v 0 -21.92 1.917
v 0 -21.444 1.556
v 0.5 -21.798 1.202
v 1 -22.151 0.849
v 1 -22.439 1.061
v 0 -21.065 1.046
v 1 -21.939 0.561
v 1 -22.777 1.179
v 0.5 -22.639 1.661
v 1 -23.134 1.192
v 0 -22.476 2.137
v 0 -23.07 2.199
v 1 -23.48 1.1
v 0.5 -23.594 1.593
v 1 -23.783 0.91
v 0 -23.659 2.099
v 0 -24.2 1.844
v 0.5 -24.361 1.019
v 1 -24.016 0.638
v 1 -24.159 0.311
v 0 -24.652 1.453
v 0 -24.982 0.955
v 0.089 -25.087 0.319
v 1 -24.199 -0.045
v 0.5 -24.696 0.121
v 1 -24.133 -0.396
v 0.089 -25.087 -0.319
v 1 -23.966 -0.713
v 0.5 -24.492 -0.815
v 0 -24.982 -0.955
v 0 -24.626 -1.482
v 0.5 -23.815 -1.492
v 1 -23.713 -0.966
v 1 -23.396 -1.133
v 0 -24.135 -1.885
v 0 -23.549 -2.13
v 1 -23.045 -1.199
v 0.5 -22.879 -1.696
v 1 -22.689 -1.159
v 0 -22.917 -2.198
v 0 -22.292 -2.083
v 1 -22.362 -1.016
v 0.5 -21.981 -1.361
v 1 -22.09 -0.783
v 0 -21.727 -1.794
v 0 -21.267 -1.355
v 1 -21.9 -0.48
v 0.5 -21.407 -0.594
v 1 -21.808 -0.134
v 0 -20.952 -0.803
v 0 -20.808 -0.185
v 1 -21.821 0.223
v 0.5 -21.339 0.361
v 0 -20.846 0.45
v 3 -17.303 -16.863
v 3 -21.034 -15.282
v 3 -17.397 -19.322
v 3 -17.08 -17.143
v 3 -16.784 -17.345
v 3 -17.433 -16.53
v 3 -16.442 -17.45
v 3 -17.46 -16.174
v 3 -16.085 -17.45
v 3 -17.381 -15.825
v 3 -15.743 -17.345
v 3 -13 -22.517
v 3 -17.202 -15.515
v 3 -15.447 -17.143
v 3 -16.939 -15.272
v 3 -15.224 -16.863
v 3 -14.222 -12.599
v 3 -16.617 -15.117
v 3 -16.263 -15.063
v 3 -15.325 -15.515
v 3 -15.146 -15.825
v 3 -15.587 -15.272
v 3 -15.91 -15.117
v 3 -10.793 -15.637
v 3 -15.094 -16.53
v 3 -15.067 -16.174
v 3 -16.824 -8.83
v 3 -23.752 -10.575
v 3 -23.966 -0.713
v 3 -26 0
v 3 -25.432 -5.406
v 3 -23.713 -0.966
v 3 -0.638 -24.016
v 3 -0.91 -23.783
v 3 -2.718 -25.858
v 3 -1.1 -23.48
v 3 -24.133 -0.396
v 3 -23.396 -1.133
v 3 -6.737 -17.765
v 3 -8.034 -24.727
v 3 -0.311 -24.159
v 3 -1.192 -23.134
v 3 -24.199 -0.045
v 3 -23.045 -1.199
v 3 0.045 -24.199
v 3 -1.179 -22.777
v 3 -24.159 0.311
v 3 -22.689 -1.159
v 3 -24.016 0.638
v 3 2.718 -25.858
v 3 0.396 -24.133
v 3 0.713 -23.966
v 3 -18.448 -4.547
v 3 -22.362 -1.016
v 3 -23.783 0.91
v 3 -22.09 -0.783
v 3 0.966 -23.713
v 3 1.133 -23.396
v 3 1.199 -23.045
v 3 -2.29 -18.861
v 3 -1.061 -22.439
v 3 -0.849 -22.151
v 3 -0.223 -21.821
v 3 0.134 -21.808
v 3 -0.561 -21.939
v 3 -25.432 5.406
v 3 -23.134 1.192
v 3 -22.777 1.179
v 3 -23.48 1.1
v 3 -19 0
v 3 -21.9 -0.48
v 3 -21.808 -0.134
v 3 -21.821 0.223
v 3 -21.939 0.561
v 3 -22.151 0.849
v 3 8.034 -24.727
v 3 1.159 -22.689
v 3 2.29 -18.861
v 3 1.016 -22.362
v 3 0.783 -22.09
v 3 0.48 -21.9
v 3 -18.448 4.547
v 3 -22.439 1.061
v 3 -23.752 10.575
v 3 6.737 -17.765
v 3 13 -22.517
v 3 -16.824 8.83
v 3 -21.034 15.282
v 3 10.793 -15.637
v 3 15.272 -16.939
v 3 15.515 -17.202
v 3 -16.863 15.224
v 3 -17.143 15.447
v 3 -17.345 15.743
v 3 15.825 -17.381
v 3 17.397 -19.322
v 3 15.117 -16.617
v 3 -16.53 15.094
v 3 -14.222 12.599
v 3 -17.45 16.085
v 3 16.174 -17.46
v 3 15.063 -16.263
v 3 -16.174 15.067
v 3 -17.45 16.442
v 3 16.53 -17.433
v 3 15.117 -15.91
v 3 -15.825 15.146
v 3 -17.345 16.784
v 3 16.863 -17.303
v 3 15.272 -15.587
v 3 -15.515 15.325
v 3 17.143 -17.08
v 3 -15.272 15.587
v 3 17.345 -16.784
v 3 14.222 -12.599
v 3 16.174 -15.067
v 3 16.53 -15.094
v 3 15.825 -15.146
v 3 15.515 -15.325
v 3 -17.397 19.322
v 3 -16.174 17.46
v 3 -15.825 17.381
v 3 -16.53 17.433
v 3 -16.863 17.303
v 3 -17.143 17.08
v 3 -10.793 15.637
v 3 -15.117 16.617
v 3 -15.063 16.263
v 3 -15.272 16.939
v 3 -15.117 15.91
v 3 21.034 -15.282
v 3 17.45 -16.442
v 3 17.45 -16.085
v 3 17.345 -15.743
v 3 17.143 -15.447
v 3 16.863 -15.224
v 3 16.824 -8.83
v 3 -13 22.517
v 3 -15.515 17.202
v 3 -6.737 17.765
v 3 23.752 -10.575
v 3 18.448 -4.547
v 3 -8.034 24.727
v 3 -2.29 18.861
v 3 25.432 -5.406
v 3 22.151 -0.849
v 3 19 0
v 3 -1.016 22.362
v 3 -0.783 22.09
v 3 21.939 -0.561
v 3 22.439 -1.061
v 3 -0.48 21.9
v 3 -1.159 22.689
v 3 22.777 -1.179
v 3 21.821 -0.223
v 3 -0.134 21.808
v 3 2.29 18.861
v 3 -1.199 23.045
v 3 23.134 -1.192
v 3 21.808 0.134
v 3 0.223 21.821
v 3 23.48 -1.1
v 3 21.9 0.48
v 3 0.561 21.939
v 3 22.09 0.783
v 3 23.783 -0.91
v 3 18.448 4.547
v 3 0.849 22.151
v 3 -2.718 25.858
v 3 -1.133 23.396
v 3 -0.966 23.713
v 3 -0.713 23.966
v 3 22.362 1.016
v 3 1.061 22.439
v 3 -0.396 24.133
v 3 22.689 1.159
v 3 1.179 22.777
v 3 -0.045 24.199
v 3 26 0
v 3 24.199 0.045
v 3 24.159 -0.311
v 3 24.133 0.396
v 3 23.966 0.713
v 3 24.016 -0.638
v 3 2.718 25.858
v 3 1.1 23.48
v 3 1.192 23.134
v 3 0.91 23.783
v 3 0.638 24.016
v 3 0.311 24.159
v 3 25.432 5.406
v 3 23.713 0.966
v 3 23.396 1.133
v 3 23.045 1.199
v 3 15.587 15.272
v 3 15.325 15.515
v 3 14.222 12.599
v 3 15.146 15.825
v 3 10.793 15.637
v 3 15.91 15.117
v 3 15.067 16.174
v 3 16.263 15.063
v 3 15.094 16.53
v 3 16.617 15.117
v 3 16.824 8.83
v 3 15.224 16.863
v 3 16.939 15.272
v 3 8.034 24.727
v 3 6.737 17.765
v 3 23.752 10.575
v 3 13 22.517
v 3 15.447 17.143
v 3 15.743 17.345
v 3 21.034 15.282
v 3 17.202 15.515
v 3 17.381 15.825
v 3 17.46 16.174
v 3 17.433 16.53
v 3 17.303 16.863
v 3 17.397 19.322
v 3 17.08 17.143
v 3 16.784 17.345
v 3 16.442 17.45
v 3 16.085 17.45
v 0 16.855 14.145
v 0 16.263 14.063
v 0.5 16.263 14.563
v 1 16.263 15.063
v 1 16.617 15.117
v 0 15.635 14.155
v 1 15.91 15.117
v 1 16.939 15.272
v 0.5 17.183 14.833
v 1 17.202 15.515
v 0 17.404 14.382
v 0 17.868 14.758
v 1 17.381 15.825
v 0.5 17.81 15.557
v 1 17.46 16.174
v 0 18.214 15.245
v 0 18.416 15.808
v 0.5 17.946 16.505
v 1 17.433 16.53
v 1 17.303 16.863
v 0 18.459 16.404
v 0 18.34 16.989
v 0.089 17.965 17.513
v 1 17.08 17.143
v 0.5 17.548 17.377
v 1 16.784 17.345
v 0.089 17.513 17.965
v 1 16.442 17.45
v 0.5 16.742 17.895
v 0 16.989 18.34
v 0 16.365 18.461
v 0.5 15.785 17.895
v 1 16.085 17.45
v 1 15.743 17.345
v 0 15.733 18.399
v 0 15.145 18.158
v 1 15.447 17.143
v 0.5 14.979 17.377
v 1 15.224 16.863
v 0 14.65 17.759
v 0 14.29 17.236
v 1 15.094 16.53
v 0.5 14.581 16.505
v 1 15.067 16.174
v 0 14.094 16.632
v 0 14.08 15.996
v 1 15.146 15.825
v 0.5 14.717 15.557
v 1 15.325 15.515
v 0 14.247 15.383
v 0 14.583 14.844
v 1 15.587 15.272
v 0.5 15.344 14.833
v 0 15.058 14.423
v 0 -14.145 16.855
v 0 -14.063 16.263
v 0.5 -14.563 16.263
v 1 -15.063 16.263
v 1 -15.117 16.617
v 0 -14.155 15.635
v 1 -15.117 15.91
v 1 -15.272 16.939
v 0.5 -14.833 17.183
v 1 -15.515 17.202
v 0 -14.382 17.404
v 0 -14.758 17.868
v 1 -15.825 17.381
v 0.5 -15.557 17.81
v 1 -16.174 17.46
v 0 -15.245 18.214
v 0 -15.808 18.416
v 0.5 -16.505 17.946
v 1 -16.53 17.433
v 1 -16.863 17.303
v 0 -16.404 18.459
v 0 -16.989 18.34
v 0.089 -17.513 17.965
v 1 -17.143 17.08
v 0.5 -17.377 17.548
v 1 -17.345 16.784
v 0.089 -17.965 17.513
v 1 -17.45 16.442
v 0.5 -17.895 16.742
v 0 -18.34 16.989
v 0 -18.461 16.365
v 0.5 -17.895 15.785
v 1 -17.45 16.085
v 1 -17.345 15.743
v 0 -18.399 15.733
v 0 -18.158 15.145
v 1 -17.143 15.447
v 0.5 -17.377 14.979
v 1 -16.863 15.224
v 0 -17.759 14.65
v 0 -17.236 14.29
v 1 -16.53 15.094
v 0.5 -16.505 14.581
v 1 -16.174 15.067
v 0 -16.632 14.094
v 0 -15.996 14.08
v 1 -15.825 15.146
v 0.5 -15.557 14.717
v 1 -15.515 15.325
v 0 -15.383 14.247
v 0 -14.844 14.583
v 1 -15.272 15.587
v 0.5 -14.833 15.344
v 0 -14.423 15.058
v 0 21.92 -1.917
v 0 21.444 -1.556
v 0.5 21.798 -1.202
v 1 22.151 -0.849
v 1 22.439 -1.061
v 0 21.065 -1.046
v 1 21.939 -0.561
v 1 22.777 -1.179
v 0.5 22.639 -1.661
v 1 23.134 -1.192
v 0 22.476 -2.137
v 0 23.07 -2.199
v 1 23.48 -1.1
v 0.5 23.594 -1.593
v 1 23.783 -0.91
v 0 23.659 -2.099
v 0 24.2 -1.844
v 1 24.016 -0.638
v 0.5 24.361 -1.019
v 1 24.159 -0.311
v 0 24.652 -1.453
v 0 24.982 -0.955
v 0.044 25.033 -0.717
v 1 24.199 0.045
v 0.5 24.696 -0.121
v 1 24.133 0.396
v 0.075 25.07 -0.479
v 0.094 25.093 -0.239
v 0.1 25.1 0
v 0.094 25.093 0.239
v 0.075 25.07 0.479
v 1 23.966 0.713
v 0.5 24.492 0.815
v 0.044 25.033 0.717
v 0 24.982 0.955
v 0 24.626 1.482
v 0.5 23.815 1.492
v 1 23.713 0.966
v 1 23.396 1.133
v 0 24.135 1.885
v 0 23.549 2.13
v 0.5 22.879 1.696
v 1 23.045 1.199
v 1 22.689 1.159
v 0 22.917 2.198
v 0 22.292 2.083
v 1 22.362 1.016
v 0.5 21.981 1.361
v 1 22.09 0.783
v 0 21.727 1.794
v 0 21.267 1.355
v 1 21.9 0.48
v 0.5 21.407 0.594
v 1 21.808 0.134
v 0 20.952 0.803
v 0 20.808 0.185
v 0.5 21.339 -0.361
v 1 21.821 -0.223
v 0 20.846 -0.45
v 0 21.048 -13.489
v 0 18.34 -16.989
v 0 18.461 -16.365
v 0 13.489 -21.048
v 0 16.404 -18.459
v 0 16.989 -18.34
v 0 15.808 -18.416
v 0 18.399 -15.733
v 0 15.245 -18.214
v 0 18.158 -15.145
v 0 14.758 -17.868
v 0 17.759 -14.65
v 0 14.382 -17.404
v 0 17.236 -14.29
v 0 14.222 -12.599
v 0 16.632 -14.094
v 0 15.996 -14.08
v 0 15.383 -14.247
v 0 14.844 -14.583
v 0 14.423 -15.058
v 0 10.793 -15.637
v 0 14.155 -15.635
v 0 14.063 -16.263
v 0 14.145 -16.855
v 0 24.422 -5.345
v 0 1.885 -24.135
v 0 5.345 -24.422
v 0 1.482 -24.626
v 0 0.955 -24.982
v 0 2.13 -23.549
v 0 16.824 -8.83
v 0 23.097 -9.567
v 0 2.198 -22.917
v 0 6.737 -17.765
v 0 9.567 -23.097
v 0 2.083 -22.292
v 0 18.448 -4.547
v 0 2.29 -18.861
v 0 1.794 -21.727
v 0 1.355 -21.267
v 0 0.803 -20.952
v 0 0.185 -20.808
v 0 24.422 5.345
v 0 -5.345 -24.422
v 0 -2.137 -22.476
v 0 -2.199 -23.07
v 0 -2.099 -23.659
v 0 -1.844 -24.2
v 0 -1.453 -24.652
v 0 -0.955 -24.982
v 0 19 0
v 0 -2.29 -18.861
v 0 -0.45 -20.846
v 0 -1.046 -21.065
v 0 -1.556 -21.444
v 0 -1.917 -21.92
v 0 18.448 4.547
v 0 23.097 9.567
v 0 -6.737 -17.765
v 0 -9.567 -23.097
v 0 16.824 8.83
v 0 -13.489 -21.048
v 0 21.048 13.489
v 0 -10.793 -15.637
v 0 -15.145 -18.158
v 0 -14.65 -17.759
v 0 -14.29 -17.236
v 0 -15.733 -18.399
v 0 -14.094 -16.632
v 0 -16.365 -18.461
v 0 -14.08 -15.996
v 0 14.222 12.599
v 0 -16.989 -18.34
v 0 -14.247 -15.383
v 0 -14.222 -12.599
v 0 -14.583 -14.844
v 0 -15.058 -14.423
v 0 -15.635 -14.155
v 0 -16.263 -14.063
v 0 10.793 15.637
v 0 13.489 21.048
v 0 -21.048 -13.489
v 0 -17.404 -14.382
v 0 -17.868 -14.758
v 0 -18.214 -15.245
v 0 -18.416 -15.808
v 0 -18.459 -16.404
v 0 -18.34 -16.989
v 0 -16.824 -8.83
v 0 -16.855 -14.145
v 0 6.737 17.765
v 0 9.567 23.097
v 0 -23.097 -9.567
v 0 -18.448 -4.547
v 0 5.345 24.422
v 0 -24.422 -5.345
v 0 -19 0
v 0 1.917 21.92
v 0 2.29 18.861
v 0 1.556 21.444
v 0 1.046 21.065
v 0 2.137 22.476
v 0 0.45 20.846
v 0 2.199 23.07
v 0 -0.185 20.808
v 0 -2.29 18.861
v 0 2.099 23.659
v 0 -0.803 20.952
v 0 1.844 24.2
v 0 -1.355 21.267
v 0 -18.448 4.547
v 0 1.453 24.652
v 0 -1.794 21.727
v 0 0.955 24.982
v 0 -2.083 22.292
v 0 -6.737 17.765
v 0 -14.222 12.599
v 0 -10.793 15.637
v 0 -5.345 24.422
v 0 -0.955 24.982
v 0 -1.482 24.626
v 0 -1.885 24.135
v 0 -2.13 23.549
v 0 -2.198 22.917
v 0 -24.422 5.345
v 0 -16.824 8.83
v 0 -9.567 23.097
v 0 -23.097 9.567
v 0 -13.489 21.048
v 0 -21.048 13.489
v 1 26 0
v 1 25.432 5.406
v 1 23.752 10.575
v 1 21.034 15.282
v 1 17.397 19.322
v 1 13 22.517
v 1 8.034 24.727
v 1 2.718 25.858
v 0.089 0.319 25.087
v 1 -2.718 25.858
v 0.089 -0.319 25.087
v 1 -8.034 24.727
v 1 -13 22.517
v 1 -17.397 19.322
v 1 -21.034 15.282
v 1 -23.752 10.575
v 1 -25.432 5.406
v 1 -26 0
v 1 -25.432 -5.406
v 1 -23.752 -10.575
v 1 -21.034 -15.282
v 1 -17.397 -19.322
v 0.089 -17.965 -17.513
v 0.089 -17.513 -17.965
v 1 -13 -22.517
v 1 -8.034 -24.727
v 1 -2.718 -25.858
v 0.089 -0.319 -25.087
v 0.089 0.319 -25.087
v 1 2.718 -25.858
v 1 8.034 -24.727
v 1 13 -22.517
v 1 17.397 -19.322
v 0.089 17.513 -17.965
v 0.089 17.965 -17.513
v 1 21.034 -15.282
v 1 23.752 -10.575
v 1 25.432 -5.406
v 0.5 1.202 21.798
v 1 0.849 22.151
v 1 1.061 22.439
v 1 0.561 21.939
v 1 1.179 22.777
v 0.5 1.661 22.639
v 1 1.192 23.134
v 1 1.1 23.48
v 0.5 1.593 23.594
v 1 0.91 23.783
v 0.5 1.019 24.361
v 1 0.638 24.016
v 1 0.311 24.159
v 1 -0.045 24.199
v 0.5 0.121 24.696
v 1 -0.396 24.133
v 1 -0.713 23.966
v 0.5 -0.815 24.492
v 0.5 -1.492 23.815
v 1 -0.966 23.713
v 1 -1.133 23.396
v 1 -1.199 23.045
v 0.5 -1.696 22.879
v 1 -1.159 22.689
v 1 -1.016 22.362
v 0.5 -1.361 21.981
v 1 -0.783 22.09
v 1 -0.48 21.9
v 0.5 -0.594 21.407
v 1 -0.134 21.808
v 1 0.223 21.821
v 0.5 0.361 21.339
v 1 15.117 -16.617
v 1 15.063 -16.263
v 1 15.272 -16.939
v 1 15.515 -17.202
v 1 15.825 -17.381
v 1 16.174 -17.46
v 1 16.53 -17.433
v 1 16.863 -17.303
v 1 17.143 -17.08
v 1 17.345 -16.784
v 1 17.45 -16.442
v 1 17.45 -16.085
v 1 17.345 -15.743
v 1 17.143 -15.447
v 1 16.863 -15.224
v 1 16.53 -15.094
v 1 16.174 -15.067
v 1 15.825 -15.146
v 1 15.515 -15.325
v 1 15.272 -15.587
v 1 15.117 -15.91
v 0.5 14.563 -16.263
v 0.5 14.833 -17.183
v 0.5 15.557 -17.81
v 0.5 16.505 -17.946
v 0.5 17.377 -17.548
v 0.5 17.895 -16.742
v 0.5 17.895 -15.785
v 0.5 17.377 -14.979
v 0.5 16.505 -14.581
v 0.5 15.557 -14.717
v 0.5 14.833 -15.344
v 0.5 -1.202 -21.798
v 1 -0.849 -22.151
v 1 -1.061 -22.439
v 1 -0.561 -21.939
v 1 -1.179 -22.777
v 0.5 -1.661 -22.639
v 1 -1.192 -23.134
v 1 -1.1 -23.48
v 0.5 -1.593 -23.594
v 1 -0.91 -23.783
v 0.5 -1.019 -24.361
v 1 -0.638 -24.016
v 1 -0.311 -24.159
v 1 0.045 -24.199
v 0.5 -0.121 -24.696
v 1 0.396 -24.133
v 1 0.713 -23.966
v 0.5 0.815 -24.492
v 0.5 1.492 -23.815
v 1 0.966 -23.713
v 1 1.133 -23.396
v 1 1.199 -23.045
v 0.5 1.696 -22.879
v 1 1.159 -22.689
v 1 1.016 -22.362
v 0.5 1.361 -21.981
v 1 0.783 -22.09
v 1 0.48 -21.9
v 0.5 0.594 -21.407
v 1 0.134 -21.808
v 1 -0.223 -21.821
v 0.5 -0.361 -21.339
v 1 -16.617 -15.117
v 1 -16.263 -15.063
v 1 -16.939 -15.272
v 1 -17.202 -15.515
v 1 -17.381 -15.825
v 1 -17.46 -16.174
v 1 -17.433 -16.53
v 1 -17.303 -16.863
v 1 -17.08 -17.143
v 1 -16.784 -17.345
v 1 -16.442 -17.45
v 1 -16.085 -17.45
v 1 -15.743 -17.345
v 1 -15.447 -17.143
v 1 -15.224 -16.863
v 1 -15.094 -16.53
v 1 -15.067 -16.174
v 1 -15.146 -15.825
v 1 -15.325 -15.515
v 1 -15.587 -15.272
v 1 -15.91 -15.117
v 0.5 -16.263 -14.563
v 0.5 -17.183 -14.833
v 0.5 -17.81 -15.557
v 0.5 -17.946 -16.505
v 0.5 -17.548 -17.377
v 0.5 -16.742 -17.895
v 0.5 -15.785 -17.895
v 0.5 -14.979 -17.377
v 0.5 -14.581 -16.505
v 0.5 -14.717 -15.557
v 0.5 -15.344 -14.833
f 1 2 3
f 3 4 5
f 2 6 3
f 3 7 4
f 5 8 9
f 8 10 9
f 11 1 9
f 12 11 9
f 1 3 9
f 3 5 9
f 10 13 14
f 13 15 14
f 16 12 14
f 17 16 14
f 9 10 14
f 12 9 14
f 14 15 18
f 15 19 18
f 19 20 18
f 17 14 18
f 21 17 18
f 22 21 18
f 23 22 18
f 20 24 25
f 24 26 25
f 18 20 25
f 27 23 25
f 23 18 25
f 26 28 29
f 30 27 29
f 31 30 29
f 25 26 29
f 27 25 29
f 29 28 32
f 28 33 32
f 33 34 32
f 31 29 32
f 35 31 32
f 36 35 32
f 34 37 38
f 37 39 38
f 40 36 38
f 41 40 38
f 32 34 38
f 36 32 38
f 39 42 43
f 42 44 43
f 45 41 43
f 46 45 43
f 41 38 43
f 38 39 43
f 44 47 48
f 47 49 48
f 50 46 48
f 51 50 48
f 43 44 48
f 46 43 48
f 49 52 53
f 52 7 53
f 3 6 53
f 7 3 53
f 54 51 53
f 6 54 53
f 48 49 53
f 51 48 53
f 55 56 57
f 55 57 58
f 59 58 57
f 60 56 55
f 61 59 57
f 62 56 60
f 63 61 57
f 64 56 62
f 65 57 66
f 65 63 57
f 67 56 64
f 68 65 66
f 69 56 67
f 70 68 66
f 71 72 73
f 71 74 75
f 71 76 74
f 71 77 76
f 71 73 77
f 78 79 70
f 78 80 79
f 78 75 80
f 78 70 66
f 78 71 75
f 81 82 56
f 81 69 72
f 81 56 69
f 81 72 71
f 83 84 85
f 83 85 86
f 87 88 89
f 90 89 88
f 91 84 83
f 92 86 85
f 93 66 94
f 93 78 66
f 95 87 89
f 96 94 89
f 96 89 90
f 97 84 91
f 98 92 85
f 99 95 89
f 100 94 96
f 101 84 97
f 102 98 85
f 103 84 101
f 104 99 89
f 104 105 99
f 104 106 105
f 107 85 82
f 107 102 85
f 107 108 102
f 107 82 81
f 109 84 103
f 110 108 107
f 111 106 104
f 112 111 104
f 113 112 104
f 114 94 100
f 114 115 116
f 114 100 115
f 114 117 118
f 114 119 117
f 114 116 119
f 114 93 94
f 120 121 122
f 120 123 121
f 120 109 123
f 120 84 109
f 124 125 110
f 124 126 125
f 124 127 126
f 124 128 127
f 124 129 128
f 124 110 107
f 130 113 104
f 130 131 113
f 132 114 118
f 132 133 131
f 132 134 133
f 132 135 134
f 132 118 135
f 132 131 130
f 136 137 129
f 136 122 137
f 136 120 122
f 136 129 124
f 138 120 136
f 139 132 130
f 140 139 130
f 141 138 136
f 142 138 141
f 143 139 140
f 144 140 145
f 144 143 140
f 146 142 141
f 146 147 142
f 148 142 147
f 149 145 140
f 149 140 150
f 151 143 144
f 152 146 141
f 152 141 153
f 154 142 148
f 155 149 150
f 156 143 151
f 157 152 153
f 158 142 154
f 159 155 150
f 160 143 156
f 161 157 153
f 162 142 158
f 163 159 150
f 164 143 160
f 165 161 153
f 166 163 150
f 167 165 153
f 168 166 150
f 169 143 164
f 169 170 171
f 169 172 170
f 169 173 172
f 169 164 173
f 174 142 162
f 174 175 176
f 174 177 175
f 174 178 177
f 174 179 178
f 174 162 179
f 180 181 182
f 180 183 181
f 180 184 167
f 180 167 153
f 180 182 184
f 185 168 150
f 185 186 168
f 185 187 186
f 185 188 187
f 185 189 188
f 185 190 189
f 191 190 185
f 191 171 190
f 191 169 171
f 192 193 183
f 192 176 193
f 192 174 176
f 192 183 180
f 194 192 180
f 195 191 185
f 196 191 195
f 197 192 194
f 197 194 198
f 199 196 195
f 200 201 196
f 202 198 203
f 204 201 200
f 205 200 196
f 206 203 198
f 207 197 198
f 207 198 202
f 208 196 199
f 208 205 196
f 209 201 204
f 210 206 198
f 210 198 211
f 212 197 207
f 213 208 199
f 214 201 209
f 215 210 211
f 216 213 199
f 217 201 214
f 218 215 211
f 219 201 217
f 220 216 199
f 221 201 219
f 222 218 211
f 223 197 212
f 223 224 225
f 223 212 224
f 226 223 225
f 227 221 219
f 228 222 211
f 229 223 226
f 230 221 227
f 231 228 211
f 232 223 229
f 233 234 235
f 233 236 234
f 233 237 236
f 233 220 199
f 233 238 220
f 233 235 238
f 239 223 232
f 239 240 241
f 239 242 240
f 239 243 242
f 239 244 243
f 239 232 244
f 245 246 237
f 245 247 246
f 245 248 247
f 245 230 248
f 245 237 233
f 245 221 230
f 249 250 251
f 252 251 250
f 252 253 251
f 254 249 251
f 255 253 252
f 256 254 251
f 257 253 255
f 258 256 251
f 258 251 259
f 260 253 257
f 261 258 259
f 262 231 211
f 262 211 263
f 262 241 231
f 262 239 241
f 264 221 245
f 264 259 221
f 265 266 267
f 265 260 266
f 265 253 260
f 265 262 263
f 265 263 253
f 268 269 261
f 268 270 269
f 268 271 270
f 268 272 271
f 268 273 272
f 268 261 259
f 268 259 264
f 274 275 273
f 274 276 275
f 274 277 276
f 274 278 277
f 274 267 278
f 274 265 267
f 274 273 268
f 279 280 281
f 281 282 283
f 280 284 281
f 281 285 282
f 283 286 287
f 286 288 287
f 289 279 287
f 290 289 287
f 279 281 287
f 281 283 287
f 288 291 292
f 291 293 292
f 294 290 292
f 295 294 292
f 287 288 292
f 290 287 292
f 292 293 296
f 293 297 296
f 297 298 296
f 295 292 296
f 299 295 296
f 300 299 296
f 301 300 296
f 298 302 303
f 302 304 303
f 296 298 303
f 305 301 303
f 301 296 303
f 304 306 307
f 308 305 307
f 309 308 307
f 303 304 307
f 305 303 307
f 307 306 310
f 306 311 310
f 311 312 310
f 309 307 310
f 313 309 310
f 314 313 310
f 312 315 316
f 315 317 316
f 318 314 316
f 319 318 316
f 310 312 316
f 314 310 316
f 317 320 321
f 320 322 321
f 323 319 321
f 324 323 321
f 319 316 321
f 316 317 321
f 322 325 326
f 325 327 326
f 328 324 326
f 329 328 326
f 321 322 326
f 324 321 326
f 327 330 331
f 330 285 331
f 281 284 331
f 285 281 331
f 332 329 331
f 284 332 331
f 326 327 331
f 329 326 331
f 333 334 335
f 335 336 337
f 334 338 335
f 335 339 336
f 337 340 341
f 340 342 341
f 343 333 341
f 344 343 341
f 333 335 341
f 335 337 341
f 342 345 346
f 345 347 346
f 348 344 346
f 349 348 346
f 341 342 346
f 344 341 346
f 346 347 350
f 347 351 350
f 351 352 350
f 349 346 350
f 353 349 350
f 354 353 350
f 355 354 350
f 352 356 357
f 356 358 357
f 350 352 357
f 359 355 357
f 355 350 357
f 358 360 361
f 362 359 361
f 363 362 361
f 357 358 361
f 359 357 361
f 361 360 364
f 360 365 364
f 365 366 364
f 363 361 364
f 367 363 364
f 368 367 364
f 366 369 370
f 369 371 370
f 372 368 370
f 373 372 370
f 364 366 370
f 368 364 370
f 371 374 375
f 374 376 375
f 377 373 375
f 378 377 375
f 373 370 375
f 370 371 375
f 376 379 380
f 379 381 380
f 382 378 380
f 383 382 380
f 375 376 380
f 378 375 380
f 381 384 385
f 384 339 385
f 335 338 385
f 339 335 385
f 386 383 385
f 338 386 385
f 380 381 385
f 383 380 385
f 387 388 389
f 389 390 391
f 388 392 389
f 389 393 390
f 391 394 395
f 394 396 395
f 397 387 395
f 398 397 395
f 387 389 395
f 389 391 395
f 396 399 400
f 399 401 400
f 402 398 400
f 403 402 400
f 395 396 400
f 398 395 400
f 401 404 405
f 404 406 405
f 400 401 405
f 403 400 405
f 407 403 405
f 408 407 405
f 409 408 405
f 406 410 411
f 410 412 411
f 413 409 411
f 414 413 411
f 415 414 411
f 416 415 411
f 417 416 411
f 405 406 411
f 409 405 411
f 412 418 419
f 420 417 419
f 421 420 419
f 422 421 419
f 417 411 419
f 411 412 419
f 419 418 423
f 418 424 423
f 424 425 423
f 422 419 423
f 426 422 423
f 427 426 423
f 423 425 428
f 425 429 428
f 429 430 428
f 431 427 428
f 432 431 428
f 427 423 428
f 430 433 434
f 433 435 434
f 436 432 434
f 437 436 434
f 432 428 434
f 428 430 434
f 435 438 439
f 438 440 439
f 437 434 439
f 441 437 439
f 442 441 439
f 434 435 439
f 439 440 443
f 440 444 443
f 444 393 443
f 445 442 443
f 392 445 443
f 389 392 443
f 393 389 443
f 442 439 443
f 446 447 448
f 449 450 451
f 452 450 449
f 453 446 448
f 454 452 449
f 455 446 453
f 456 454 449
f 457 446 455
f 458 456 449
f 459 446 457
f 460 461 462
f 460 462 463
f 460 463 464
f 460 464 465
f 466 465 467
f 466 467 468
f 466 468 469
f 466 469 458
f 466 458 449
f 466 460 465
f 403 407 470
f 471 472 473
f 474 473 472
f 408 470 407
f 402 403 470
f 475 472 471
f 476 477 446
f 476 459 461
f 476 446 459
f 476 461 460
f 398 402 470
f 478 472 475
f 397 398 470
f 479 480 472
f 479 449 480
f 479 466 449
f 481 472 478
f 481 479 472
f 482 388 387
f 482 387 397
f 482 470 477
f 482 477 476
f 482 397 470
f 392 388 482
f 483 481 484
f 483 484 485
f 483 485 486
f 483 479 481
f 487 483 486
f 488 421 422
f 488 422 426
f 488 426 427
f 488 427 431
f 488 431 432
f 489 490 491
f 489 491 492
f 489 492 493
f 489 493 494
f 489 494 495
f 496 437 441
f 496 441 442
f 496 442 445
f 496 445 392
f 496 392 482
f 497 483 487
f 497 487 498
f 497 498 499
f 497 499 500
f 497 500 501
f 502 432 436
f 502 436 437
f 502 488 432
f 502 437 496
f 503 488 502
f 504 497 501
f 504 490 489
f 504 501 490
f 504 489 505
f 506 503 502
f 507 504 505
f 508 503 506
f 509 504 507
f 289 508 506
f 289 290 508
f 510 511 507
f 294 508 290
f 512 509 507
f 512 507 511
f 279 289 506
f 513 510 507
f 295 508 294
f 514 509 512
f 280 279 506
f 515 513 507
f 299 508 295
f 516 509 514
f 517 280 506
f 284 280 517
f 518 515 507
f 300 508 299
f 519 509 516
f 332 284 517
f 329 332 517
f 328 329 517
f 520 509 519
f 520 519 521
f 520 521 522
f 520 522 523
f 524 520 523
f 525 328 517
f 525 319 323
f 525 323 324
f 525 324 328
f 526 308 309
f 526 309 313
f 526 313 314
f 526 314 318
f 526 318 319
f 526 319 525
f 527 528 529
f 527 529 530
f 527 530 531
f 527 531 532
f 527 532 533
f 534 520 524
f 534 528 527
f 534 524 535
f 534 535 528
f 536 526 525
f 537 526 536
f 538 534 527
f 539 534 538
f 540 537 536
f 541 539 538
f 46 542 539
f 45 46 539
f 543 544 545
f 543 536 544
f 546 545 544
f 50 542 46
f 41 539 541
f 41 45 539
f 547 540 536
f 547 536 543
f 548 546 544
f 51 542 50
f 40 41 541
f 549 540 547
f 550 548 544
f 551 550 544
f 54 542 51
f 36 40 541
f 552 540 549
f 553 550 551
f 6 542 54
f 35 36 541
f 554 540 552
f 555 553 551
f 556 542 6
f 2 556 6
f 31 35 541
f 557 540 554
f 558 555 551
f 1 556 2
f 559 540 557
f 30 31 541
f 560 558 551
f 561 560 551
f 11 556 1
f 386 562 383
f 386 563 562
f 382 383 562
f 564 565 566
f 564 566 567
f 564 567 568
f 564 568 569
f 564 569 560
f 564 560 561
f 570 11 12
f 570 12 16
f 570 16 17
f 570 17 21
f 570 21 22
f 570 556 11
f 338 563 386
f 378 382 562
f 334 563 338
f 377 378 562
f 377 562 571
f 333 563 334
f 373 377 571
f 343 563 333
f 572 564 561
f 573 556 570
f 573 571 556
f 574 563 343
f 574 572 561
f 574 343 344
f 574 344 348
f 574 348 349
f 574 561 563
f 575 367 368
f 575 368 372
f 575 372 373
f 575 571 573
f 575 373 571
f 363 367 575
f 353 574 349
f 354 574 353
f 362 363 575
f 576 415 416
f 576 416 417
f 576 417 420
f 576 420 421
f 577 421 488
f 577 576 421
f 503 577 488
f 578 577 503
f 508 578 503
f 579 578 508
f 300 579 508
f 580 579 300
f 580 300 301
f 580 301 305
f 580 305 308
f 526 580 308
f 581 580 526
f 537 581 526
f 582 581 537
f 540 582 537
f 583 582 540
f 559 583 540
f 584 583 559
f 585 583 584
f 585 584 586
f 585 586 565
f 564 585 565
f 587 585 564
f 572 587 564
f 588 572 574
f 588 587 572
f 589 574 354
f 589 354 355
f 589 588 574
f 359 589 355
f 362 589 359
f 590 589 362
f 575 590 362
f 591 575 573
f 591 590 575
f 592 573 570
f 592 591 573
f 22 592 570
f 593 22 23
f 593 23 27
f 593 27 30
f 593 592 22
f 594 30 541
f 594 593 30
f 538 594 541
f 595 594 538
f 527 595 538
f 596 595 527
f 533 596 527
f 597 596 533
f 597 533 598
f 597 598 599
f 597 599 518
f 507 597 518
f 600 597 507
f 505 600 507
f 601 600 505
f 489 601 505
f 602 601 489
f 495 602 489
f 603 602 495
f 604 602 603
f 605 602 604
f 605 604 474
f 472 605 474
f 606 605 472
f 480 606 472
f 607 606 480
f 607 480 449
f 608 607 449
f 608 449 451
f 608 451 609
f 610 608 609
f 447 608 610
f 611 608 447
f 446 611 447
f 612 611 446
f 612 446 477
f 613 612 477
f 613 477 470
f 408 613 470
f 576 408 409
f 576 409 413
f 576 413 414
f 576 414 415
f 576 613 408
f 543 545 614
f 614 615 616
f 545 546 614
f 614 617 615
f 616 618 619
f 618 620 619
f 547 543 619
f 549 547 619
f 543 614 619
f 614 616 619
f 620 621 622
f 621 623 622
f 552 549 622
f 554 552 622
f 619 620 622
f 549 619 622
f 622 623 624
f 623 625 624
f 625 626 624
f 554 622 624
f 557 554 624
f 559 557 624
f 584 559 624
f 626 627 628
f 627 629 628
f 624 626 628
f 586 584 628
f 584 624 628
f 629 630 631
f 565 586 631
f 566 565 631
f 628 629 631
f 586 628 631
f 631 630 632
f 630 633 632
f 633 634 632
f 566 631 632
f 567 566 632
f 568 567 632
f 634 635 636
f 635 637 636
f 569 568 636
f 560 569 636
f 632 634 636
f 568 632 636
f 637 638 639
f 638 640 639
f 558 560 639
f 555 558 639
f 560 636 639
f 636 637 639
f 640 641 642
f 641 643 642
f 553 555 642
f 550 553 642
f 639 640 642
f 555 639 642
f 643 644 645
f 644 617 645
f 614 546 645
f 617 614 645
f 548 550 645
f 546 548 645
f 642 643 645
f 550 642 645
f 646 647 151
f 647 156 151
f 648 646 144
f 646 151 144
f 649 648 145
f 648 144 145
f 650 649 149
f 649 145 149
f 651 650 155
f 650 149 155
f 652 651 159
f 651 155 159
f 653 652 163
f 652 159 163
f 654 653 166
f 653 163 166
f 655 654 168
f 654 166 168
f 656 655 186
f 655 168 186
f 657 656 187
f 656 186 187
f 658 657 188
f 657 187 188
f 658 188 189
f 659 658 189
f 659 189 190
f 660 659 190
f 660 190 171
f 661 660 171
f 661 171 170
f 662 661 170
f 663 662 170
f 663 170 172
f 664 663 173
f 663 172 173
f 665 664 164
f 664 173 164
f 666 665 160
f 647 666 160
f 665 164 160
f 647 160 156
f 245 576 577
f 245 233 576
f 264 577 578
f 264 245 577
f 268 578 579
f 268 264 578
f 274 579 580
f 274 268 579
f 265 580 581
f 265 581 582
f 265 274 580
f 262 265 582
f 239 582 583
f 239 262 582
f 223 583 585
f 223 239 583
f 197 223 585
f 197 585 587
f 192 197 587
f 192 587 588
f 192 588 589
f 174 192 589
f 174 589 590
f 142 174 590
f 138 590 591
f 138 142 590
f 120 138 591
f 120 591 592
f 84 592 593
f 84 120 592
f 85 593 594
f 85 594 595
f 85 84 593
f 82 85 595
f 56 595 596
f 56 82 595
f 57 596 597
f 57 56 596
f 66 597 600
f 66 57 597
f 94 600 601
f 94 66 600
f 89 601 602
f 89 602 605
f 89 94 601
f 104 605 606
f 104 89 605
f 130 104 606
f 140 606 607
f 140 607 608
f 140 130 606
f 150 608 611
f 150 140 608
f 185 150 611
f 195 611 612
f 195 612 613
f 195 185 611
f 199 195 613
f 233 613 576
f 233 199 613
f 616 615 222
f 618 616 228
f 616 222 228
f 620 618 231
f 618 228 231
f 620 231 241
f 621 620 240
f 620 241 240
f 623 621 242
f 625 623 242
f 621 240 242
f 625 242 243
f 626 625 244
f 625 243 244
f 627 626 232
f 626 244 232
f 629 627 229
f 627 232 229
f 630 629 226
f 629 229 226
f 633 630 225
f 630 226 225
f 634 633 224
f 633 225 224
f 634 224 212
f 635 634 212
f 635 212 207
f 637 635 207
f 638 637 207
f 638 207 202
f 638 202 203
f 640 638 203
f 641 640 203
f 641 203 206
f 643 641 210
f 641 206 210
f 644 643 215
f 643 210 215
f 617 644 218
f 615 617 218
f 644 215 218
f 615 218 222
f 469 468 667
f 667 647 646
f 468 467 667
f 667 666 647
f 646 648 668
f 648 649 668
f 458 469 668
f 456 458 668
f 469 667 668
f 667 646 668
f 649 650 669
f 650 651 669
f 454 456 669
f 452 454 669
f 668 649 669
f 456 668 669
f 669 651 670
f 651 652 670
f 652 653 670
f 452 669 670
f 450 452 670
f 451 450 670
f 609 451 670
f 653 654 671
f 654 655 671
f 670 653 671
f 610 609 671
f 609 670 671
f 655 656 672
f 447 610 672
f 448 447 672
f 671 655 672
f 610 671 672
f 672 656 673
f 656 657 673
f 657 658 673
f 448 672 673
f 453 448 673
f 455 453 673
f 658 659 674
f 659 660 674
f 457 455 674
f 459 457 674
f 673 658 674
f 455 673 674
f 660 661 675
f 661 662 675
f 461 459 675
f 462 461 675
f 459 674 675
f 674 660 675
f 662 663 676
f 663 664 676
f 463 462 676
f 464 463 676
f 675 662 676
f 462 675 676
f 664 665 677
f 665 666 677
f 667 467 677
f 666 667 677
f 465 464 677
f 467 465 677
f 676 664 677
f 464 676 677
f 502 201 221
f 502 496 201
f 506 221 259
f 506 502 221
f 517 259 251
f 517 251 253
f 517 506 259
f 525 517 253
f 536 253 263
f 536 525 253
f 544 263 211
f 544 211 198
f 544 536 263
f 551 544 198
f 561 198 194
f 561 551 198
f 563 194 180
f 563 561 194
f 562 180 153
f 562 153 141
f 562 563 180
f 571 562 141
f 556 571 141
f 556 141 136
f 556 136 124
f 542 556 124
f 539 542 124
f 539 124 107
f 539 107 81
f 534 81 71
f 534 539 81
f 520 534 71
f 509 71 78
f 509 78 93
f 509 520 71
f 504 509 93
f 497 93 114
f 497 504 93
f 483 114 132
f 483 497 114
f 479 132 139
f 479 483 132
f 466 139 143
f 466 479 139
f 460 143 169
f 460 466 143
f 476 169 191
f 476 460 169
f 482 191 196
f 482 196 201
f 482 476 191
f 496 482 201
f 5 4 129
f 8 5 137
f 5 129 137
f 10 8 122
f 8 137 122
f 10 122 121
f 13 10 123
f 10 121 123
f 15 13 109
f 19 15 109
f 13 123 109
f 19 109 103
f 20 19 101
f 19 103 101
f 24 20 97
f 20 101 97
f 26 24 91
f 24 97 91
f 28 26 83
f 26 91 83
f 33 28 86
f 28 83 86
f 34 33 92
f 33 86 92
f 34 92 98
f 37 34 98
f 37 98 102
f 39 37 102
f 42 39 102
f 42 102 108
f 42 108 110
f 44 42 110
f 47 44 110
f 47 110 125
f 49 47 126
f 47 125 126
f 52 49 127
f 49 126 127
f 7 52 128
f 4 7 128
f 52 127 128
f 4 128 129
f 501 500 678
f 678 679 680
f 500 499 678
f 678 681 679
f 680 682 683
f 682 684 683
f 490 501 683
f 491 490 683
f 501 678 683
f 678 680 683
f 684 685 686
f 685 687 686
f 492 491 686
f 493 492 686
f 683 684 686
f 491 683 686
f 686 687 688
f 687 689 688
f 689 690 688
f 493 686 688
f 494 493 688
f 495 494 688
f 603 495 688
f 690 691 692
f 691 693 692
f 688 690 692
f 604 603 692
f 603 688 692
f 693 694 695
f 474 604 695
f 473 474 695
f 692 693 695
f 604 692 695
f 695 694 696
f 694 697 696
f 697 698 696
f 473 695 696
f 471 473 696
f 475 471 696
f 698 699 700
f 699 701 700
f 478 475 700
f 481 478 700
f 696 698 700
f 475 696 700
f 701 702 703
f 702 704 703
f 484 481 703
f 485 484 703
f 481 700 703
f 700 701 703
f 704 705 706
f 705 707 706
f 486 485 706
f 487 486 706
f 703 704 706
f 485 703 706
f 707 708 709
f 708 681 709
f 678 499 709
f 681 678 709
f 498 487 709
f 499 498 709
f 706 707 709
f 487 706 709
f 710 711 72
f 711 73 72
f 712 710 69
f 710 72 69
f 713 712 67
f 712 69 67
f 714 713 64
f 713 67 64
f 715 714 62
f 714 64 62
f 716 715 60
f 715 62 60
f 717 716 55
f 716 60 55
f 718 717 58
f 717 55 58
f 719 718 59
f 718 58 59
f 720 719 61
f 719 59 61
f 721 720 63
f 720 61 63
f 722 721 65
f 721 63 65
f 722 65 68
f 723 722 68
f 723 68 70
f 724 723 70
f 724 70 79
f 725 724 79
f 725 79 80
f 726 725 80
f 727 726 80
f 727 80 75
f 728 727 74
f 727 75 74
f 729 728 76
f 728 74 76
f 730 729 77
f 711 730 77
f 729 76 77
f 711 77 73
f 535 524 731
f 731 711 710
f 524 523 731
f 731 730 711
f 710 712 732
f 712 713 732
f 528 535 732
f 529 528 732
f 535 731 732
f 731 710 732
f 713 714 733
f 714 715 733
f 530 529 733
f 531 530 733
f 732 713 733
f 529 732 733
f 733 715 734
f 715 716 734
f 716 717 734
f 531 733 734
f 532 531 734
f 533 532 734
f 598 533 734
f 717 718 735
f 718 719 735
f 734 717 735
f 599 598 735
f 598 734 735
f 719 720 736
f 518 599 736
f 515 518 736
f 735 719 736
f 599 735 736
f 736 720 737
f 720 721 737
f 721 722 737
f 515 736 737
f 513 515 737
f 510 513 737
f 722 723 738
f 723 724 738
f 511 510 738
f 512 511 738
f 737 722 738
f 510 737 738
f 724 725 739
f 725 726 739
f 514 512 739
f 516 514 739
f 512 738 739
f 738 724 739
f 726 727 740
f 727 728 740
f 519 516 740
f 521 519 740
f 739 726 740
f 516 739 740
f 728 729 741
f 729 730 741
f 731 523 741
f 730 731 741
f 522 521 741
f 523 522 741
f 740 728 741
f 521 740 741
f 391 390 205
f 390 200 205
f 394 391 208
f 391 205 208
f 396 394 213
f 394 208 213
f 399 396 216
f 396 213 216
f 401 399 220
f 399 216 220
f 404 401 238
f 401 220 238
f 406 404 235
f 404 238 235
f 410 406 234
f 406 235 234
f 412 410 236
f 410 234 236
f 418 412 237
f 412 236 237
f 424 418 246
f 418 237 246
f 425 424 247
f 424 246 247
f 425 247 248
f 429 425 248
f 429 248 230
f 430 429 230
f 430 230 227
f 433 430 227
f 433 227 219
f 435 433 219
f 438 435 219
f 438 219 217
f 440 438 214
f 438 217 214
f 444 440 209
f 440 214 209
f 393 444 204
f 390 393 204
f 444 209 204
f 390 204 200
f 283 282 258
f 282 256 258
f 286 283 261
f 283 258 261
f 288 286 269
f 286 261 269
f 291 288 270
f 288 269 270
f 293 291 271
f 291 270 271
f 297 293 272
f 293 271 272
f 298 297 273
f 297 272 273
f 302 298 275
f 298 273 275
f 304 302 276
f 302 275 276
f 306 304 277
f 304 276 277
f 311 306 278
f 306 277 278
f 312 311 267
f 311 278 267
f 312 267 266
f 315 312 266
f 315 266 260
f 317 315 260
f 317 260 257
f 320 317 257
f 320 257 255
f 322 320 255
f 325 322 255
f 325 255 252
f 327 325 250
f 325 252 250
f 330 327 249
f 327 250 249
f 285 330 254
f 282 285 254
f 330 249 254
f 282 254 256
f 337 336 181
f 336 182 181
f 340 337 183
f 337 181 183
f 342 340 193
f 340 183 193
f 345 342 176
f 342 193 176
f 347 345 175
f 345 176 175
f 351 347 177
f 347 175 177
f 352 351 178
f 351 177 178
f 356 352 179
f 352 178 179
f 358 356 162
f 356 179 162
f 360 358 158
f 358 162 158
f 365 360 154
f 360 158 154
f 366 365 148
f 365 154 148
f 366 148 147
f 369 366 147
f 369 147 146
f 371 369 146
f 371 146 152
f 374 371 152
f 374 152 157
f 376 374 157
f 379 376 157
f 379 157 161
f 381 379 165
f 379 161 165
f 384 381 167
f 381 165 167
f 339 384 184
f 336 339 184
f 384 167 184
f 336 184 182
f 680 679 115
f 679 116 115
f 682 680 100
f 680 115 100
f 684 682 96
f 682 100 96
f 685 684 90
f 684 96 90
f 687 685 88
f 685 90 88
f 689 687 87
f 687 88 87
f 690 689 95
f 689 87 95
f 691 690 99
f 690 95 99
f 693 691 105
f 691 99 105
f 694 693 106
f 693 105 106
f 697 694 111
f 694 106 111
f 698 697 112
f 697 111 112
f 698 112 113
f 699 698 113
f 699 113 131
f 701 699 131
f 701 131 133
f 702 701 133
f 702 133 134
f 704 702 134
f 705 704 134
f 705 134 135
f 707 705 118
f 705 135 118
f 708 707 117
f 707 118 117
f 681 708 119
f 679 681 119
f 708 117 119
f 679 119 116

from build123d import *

# Parameters (mm, degrees)
HOLE_WIZARD_M21_D           = 2.4
HOLE_WIZARD_M21_CSINK_D     = 4.4
HOLE_WIZARD_M21_CSINK_ANGLE = 90
PATTERN_CIRCULAR_1_COUNT    = 8


with BuildPart() as part:
    # Эскиз1 → Повернуть1 (revolve)
    with BuildSketch(Plane.XY):
        Polygon((0, 19), (0, 25), (1, 26), (3, 26), (3, 19), align=None)
    revolve(axis=Axis((0, 0, 0), (1, 0, 0)))

    # Зенковка для винта с потайной головкой M21 (through all)
    with Locations(Plane.ZY):
        with Locations((16.263455967, 16.263455967)):
            hole_wizard_m21 = CounterSinkHole(HOLE_WIZARD_M21_D / 2, HOLE_WIZARD_M21_CSINK_D / 2, counter_sink_angle=HOLE_WIZARD_M21_CSINK_ANGLE)

    # Круговой массив1: Зенковка для винта с потайной головкой M21 ×8 about axis
    pattern_circular_1_axis = Axis((0, 0, 0), (1, 0, 0))
    for i in range(1, PATTERN_CIRCULAR_1_COUNT):
        add(hole_wizard_m21.rotate(pattern_circular_1_axis, i * 360 / PATTERN_CIRCULAR_1_COUNT), mode=Mode.SUBTRACT)


solid = part.part
